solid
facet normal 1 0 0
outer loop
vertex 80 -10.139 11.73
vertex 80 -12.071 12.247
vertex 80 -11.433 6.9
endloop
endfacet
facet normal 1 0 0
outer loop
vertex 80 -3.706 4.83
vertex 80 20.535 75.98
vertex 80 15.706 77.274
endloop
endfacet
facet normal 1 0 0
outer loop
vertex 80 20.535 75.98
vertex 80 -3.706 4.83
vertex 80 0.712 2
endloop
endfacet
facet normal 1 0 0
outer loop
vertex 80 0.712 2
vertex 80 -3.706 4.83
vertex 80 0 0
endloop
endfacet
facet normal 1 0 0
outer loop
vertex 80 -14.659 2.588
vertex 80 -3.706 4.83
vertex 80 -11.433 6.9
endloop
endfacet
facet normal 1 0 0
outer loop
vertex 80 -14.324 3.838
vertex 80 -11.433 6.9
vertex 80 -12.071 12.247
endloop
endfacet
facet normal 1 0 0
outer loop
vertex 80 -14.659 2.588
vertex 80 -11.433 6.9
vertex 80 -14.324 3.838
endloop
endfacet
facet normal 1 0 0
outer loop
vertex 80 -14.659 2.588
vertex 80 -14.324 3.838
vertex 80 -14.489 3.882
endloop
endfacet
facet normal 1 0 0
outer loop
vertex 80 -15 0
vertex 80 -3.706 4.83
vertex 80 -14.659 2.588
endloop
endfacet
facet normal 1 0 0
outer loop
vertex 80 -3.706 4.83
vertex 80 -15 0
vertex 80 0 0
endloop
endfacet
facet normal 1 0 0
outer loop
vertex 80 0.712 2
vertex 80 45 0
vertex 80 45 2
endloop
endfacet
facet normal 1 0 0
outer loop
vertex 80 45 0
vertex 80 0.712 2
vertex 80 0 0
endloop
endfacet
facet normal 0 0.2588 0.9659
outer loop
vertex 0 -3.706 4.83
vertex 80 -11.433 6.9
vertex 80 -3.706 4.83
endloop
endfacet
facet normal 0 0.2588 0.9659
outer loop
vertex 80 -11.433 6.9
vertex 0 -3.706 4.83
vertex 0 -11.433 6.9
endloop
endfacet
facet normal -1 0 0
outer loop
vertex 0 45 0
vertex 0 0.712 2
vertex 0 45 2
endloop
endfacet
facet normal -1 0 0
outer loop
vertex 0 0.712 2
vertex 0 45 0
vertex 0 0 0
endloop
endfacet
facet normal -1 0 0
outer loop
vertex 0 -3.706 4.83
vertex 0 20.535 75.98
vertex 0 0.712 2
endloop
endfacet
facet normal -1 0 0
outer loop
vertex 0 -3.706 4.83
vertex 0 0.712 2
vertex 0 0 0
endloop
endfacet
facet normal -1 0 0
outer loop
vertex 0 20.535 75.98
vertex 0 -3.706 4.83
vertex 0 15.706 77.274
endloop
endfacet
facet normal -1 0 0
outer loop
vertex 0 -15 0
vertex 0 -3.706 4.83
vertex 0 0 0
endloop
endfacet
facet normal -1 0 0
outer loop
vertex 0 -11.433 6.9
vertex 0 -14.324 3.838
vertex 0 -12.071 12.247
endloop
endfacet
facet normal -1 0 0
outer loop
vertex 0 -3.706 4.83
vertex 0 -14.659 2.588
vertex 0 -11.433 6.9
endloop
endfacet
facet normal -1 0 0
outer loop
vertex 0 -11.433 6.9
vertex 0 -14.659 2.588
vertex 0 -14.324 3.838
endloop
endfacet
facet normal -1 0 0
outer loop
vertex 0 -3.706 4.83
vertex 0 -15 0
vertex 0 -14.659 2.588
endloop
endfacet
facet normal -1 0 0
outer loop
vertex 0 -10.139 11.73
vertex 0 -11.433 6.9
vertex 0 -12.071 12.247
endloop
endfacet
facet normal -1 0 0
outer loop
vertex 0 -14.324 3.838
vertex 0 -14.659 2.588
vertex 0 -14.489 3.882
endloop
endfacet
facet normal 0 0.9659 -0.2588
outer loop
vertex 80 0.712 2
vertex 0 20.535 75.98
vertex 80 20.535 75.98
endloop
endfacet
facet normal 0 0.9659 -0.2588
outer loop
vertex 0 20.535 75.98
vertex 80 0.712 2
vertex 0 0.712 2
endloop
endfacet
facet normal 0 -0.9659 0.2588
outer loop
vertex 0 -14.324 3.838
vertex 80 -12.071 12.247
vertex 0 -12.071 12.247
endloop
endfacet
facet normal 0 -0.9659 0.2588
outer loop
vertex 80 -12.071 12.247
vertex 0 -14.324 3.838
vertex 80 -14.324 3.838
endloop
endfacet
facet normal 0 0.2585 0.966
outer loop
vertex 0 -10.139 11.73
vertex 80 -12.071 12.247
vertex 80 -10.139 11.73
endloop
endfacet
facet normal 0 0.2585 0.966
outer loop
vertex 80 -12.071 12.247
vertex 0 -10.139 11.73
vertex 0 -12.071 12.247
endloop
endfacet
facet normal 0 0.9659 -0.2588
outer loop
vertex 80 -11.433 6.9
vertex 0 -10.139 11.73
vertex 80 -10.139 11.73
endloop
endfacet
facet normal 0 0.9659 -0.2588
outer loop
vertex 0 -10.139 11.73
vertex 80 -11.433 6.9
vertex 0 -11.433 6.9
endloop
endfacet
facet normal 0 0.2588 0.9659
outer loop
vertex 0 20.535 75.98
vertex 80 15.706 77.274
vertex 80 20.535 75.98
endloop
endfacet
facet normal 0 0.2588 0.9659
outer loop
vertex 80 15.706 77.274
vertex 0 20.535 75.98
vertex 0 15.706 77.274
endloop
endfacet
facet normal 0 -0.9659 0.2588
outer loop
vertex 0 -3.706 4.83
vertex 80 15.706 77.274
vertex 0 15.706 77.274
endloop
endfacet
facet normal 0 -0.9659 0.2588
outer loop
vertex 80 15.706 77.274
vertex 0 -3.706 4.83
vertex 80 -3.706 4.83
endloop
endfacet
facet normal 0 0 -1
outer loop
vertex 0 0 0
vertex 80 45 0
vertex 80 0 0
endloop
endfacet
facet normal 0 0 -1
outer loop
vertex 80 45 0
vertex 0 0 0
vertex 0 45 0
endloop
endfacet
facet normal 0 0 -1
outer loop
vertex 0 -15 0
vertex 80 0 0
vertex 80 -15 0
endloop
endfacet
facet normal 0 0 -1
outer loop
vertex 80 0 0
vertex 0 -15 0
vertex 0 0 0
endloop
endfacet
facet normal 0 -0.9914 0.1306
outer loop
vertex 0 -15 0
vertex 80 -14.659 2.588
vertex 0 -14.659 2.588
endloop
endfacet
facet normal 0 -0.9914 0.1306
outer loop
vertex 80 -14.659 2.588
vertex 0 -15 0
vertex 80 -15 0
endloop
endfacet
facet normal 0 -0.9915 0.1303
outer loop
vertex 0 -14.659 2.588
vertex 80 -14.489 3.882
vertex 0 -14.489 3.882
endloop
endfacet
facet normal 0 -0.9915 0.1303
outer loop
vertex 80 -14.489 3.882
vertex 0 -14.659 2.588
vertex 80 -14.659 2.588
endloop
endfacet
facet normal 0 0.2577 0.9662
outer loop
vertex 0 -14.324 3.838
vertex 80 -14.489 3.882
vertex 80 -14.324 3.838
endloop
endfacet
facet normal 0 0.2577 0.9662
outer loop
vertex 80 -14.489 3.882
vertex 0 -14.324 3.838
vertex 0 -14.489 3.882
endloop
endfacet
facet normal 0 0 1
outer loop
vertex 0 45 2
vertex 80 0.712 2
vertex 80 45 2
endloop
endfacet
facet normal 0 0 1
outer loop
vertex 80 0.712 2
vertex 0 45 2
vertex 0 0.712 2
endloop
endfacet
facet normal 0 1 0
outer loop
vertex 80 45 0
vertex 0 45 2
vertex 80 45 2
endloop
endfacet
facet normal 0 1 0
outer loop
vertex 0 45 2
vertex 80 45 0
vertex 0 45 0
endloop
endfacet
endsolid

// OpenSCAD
/*
  Phone Dimensions
    Width: ~78mm
    Depth: ~8mm
    Height: ~160mm

  Recline: 15 degrees
*/

phoneWidth = 80;
phoneDepth = 10;
phoneHeight = 160;

angle = 15;

baseDepth = 45;
baseThickness = 5;
baseWall = 2;

module holder(ARGS) {
  translate ([0, -baseThickness, 0]) {
    rotate(-angle, [1, 0, 0]) {
      cube([phoneWidth, baseThickness, phoneHeight/2]);

      translate([0, -phoneDepth, 0]) {
        cube([phoneWidth, phoneDepth + baseThickness, baseThickness]);
        cube([phoneWidth, baseWall, baseThickness * 2]);
      }
    }
  }

  translate([phoneWidth,0,0]) {
    rotate(-90, [0,0,1]) {
      rotate(90, [1,0,0]) {
        rotate_extrude(angle=angle, convexity = 10) {
          square(size = [phoneDepth + baseThickness, phoneWidth]);
        }
      }
    }
  }
}

module flat() {
  translate([0,-(phoneWidth / 2),-baseThickness]) {
    cube([phoneWidth, phoneWidth, baseThickness]);
  }
}

difference() {
  holder();

  flat();
}

cube([phoneWidth, baseDepth, baseWall]);
